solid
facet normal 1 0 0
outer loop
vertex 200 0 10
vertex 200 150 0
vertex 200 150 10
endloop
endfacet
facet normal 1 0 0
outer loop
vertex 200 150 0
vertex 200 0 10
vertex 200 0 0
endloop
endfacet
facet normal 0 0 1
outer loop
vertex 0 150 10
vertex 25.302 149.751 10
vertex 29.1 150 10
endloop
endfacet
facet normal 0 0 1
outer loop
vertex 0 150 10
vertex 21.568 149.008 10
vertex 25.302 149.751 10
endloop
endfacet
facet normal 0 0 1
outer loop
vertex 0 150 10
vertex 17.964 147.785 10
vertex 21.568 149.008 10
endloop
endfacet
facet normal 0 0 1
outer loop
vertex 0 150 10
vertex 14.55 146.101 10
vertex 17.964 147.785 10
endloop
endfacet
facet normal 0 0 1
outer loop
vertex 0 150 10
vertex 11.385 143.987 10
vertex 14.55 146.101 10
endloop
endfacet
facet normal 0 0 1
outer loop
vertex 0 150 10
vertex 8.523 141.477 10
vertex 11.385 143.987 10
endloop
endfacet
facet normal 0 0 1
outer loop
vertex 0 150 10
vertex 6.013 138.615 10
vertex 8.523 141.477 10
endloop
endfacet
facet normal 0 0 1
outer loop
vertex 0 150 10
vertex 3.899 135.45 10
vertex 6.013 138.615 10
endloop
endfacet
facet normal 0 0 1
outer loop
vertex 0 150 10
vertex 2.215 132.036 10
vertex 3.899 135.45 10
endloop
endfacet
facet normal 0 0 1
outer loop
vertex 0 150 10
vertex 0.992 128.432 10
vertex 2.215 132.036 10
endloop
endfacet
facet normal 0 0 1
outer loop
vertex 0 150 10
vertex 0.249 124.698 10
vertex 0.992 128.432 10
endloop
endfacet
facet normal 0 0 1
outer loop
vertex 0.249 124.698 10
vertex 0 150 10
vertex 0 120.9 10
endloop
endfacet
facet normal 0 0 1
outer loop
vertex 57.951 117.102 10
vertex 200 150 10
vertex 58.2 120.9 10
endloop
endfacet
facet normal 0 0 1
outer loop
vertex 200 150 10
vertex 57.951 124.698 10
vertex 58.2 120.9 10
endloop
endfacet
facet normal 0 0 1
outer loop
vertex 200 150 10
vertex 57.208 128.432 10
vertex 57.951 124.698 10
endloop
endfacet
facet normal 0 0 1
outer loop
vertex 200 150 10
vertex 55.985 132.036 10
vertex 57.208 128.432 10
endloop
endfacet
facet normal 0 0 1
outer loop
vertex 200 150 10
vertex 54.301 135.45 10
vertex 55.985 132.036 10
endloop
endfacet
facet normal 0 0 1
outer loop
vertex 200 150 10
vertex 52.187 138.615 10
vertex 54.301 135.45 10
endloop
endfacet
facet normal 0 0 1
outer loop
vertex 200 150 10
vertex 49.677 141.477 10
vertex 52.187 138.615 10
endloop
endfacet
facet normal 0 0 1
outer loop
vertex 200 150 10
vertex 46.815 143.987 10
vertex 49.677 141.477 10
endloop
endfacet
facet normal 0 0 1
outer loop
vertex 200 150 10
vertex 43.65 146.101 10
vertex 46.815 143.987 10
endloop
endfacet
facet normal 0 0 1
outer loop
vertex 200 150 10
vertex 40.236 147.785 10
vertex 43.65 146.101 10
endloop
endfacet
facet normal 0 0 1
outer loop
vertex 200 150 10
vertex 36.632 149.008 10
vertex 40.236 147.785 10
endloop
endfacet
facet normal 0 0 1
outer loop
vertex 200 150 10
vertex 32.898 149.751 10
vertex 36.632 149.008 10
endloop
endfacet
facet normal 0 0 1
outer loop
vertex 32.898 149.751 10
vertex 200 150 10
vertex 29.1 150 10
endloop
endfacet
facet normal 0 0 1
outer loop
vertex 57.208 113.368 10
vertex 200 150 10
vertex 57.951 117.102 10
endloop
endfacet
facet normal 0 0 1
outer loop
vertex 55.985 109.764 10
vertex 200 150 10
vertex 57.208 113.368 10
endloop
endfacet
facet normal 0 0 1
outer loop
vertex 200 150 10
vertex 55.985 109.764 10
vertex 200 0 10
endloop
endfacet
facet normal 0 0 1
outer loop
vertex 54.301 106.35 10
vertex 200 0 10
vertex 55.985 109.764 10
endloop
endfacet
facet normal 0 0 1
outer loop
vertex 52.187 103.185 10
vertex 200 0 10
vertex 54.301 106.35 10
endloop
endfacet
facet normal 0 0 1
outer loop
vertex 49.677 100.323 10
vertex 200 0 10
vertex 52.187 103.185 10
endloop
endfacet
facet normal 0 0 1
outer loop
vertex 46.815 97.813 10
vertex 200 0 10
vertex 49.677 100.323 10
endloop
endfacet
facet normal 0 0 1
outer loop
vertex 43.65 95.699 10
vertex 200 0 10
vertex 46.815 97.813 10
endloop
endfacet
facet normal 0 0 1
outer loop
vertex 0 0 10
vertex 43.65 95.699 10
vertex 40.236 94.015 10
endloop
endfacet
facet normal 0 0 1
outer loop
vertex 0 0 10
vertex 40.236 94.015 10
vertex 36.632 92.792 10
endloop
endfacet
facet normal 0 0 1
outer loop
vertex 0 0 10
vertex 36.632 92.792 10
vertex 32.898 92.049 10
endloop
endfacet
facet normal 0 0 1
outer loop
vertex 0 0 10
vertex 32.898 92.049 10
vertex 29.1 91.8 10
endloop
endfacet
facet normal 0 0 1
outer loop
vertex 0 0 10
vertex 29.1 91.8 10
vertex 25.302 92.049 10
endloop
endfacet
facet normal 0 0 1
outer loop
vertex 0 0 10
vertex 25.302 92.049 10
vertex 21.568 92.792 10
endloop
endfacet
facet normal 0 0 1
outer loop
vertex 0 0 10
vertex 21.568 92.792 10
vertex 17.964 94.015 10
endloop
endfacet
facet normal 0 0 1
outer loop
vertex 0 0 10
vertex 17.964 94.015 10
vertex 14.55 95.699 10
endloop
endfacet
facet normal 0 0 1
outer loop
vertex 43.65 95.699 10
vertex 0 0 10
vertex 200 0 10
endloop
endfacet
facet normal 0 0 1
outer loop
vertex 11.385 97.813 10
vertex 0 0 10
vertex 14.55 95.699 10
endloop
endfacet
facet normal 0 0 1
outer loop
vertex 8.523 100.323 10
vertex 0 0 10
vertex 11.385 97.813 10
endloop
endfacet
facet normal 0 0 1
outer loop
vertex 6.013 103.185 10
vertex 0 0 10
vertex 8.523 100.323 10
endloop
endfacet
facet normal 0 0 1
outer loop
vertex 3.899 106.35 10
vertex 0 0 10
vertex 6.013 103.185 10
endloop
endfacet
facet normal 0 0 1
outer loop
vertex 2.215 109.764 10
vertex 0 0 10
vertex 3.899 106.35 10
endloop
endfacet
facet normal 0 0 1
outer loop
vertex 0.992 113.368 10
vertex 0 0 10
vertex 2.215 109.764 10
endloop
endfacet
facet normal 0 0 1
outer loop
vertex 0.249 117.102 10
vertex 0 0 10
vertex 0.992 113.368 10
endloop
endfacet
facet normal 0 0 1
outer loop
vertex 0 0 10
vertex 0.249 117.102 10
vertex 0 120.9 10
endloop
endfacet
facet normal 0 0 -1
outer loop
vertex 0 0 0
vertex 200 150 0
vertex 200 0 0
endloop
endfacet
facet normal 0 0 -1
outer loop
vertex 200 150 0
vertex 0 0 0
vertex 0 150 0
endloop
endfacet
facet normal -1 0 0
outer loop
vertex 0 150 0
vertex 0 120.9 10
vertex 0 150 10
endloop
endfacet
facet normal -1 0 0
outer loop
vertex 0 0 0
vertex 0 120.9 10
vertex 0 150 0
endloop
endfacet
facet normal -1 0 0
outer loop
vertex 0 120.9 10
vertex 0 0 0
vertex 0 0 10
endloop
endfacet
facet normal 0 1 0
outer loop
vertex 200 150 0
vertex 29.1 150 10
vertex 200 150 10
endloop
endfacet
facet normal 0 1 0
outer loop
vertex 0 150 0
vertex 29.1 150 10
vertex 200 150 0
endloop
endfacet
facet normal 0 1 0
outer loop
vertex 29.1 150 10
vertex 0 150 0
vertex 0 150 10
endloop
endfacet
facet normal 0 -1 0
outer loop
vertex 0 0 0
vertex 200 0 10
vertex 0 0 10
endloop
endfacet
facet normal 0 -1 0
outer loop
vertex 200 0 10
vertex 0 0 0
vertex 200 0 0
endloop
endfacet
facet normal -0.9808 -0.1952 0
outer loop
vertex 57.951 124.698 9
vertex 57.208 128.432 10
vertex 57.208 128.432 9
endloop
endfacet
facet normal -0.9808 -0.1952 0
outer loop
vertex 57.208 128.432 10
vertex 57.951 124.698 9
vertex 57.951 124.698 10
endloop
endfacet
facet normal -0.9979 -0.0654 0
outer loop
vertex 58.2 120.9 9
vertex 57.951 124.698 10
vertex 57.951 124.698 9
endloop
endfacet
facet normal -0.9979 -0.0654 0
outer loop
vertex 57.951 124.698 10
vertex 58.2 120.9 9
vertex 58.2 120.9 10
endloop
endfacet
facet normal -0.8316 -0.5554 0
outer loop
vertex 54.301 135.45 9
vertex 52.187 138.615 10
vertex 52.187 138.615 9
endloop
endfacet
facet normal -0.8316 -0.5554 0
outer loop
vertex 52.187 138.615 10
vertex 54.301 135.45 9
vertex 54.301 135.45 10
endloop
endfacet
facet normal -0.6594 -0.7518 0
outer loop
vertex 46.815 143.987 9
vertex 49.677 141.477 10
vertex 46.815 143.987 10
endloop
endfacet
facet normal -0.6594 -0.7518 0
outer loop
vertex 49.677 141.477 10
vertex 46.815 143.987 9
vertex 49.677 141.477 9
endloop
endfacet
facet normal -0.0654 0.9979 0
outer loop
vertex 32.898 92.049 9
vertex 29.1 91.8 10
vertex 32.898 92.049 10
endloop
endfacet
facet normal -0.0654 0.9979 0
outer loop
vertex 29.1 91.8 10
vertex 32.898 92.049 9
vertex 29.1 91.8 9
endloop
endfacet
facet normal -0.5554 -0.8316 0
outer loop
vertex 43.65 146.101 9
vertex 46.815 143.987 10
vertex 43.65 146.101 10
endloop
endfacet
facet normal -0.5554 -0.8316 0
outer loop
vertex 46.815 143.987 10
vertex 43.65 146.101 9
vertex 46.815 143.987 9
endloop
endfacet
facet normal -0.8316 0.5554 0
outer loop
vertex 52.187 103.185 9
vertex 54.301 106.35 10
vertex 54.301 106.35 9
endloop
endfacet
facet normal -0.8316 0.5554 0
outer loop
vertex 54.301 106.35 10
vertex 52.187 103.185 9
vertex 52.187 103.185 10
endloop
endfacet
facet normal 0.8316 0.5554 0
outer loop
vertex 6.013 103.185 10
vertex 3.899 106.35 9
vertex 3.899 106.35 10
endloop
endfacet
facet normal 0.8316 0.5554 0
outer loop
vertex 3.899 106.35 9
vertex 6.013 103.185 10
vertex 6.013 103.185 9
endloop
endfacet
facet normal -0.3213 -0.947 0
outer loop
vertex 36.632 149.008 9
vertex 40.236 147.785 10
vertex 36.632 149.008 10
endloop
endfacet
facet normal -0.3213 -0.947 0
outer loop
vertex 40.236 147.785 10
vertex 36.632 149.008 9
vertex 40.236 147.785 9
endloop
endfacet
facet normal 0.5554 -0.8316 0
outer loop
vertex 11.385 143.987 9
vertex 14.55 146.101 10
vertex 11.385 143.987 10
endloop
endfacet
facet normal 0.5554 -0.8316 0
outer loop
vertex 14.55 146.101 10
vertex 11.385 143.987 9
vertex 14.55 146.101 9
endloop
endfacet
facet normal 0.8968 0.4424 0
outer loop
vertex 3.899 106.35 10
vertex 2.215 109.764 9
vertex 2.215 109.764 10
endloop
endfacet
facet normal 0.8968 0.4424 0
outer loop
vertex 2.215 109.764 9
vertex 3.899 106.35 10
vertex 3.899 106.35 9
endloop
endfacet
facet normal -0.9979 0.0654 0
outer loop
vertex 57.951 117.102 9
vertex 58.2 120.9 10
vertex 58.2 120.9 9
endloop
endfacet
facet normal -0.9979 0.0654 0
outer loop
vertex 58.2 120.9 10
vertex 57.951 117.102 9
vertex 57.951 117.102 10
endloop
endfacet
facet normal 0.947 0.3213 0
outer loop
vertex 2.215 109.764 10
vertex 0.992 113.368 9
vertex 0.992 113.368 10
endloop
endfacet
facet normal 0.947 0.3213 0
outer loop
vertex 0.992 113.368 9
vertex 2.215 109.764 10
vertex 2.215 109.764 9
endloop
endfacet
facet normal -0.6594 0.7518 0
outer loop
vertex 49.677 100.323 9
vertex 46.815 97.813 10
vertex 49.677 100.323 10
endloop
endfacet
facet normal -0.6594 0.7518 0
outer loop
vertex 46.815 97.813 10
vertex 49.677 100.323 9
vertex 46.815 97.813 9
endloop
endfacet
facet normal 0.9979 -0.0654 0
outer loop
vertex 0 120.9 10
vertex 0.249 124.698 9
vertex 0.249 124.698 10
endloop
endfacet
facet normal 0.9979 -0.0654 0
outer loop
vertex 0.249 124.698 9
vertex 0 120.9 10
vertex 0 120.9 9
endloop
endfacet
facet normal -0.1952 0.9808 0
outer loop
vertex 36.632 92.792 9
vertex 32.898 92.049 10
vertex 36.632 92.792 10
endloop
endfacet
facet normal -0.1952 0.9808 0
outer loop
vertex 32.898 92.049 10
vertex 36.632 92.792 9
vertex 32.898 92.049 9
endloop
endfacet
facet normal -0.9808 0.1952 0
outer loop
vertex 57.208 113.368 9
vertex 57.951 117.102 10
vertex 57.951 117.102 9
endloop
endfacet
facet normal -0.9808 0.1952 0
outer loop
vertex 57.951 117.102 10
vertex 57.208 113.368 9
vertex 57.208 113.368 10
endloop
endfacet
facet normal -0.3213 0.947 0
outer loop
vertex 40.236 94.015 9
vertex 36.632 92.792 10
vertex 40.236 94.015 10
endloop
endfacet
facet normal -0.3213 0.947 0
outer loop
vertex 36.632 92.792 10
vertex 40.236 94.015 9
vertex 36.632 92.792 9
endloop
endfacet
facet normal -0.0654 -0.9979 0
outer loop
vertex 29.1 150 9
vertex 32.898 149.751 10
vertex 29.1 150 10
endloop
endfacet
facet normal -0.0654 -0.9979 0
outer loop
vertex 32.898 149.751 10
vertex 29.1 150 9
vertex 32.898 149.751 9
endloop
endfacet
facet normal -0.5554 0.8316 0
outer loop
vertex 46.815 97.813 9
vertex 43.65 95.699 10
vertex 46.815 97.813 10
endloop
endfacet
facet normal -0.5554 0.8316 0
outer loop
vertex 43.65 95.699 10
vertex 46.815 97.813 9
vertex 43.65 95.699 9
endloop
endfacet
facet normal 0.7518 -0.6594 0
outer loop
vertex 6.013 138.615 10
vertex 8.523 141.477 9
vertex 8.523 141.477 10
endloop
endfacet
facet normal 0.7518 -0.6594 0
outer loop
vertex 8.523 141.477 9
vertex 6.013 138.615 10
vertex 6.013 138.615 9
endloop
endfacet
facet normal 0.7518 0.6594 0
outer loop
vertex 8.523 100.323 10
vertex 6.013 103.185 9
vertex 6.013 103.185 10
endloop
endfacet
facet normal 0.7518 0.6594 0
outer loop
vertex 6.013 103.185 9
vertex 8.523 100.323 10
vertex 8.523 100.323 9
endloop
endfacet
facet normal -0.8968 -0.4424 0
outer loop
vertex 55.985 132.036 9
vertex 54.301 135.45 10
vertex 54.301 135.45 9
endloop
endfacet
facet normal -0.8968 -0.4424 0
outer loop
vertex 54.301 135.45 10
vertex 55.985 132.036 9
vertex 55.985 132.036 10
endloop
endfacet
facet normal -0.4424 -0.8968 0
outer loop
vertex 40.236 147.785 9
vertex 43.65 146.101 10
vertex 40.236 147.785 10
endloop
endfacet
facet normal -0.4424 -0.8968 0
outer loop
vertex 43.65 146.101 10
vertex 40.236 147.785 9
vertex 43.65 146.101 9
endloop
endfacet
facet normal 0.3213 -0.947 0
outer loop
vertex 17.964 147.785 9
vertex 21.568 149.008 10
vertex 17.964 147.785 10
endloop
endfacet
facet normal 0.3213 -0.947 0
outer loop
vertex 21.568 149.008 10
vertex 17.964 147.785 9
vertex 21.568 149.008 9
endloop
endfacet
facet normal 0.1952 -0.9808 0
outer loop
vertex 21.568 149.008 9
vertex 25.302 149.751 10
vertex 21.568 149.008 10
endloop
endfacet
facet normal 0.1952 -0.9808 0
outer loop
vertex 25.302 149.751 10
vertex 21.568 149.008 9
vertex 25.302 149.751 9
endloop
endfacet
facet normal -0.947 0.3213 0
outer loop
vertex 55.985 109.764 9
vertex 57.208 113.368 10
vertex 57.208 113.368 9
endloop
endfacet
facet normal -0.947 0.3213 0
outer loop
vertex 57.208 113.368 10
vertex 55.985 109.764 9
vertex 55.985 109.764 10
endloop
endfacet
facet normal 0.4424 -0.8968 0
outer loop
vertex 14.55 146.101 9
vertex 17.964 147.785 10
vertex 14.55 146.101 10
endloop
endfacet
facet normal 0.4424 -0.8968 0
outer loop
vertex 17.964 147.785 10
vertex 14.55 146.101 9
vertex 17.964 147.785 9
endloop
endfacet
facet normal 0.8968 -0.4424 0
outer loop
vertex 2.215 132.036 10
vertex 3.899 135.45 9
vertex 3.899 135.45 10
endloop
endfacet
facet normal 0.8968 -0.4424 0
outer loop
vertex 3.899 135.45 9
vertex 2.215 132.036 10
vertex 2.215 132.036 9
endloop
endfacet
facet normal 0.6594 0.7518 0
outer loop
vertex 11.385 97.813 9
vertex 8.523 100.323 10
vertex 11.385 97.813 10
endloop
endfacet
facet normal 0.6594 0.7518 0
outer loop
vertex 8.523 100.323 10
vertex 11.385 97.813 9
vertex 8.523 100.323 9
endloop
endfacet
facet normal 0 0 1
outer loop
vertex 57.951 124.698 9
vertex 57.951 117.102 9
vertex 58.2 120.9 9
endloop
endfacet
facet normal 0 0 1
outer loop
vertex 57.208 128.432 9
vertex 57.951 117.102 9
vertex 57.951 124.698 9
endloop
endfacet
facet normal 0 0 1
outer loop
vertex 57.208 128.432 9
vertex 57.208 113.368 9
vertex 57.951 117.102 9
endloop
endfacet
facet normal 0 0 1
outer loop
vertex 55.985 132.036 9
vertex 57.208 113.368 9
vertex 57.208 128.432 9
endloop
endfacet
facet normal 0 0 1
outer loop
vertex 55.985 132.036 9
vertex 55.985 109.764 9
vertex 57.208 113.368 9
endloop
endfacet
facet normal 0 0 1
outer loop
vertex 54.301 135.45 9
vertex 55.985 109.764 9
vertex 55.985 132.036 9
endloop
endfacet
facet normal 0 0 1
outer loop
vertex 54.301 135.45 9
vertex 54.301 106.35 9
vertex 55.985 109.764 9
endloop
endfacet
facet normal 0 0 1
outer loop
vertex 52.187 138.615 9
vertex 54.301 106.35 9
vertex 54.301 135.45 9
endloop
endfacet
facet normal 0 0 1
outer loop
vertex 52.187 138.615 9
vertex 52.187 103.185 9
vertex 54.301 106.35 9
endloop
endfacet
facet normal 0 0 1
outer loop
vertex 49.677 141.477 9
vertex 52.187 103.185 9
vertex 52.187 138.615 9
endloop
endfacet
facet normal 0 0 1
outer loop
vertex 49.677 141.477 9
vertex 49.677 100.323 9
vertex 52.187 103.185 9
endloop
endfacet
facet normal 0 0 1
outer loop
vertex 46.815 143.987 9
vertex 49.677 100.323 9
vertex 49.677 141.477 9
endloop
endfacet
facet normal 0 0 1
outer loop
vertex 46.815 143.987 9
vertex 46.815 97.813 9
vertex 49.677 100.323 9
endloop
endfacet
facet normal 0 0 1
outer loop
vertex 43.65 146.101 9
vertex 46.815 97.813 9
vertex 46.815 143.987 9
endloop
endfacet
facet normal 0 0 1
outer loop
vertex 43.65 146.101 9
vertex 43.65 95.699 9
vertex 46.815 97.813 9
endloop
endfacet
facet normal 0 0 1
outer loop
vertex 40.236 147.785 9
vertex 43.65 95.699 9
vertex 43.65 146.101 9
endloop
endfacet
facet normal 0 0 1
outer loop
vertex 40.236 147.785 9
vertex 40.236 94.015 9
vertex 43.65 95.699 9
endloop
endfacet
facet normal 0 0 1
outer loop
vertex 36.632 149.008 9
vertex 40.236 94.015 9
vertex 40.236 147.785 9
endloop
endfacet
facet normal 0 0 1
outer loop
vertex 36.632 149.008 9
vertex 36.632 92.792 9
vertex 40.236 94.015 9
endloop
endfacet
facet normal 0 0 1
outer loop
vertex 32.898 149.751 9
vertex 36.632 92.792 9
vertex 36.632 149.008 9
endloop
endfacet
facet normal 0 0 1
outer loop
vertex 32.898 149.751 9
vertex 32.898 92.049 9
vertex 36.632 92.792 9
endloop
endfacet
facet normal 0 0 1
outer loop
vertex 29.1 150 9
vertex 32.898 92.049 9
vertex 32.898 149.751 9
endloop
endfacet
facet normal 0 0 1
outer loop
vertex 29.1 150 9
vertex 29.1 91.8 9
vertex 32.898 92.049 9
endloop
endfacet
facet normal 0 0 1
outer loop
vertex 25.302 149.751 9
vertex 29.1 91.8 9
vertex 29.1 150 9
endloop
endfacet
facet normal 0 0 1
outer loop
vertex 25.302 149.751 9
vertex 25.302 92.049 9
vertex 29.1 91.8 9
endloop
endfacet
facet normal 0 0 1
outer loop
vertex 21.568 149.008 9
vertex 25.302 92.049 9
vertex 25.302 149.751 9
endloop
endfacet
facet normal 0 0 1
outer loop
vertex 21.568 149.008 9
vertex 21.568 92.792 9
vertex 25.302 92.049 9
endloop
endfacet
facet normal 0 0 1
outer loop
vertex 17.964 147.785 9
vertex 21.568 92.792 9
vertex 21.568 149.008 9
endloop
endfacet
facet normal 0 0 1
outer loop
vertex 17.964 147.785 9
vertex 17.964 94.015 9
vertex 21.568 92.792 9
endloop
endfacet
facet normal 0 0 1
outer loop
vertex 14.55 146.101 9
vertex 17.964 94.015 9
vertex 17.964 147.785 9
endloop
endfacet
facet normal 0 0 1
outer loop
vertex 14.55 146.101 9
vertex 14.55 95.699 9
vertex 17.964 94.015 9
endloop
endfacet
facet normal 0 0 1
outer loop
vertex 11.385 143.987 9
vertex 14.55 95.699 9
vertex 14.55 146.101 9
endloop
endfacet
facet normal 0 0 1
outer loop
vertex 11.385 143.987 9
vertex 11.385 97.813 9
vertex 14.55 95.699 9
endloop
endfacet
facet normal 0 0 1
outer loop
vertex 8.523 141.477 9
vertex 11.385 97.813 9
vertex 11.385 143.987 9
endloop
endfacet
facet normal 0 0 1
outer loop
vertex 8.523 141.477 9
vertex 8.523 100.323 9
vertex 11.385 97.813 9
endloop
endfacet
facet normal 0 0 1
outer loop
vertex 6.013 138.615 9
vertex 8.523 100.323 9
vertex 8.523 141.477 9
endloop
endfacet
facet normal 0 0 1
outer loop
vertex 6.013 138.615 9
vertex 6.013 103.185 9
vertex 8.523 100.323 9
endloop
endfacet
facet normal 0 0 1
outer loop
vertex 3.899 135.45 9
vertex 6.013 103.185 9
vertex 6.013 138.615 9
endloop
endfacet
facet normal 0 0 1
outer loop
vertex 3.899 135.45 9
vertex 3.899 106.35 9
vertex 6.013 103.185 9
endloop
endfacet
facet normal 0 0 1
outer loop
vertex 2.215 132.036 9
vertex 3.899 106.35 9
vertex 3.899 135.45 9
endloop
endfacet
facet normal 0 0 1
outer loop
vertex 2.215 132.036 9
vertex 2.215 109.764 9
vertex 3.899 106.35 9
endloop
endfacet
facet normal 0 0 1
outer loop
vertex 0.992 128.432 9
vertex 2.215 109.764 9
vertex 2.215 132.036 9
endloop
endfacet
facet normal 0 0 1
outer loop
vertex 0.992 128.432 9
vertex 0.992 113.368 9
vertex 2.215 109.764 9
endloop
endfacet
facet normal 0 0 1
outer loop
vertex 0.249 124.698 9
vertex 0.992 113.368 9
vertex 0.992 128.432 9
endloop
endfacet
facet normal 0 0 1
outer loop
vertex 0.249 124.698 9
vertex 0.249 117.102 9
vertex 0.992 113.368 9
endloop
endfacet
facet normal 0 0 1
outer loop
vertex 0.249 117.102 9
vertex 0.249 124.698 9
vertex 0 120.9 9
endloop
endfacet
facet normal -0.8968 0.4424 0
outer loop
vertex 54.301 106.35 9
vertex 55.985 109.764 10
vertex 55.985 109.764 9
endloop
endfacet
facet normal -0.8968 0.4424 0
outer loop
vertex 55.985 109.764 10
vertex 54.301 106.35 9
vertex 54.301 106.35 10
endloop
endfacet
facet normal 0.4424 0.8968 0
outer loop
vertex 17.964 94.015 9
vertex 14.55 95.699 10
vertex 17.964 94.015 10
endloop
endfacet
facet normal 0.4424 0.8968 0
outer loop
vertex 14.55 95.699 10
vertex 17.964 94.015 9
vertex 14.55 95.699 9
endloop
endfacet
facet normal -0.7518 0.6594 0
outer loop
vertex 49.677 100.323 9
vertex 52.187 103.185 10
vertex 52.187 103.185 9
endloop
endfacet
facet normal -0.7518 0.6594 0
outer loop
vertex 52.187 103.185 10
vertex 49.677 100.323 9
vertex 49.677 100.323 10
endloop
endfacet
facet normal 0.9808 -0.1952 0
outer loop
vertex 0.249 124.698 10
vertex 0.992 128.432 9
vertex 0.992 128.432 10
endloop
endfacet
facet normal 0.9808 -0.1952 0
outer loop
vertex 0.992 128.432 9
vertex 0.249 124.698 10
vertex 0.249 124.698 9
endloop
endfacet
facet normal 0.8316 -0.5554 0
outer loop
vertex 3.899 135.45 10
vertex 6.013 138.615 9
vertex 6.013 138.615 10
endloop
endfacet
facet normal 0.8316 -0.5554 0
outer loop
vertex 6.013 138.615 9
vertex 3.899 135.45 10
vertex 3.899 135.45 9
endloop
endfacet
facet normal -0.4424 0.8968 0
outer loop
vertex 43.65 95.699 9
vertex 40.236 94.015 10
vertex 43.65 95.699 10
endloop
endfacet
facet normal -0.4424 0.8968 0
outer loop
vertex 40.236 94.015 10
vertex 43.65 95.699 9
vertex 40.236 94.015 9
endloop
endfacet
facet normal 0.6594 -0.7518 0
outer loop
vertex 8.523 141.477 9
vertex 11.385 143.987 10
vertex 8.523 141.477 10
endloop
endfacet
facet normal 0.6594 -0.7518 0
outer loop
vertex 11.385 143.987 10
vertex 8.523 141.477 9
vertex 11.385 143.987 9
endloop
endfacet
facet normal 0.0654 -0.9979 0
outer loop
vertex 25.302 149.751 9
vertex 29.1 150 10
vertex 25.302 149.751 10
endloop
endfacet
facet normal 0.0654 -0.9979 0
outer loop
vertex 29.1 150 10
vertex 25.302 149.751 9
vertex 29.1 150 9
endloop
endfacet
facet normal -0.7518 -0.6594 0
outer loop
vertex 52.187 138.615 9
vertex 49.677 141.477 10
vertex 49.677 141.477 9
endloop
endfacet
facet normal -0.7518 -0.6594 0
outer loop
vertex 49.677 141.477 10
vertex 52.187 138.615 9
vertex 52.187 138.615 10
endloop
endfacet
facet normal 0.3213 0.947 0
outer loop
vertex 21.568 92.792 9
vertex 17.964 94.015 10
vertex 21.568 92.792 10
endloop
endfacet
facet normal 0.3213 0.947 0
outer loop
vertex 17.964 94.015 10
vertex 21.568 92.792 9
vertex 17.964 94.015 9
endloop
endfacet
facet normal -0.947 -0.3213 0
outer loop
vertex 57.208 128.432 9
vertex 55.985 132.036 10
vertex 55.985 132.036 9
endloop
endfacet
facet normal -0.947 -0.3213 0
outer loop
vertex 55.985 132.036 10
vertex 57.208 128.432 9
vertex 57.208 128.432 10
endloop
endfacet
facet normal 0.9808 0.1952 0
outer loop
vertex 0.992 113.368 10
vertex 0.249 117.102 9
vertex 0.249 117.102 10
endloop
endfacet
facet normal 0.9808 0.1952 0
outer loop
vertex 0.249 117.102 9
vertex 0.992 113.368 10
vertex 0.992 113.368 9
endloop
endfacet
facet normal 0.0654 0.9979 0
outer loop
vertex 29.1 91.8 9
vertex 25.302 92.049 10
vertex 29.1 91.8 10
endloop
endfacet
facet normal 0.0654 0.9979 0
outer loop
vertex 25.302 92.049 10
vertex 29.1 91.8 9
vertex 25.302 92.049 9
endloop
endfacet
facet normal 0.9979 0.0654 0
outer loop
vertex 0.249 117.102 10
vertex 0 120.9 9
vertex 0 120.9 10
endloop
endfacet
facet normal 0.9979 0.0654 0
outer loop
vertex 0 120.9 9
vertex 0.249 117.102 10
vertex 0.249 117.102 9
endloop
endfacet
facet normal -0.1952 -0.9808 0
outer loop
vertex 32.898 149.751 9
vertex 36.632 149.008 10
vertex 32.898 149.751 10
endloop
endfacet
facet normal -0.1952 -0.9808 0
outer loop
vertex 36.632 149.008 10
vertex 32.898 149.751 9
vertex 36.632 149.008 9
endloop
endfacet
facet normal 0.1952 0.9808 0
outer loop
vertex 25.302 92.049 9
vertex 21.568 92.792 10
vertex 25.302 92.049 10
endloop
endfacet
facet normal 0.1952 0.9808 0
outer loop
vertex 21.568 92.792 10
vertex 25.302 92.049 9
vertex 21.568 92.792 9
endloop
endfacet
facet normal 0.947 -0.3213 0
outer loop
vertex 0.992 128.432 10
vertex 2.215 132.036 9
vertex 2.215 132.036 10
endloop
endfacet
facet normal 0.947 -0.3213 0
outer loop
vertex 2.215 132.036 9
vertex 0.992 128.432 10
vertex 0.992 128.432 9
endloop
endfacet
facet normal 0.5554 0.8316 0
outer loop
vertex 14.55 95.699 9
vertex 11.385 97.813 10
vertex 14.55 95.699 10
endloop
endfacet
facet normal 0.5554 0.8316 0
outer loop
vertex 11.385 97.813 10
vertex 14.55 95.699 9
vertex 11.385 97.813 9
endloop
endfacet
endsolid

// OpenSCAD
$fn = 48;


difference() {
	cube(size = [200, 150, 10]);
	translate(v = [29.1000000000, 120.9000000000, 9]) {
		cylinder(d = 58.2000000000, h = 1);
	}
}
